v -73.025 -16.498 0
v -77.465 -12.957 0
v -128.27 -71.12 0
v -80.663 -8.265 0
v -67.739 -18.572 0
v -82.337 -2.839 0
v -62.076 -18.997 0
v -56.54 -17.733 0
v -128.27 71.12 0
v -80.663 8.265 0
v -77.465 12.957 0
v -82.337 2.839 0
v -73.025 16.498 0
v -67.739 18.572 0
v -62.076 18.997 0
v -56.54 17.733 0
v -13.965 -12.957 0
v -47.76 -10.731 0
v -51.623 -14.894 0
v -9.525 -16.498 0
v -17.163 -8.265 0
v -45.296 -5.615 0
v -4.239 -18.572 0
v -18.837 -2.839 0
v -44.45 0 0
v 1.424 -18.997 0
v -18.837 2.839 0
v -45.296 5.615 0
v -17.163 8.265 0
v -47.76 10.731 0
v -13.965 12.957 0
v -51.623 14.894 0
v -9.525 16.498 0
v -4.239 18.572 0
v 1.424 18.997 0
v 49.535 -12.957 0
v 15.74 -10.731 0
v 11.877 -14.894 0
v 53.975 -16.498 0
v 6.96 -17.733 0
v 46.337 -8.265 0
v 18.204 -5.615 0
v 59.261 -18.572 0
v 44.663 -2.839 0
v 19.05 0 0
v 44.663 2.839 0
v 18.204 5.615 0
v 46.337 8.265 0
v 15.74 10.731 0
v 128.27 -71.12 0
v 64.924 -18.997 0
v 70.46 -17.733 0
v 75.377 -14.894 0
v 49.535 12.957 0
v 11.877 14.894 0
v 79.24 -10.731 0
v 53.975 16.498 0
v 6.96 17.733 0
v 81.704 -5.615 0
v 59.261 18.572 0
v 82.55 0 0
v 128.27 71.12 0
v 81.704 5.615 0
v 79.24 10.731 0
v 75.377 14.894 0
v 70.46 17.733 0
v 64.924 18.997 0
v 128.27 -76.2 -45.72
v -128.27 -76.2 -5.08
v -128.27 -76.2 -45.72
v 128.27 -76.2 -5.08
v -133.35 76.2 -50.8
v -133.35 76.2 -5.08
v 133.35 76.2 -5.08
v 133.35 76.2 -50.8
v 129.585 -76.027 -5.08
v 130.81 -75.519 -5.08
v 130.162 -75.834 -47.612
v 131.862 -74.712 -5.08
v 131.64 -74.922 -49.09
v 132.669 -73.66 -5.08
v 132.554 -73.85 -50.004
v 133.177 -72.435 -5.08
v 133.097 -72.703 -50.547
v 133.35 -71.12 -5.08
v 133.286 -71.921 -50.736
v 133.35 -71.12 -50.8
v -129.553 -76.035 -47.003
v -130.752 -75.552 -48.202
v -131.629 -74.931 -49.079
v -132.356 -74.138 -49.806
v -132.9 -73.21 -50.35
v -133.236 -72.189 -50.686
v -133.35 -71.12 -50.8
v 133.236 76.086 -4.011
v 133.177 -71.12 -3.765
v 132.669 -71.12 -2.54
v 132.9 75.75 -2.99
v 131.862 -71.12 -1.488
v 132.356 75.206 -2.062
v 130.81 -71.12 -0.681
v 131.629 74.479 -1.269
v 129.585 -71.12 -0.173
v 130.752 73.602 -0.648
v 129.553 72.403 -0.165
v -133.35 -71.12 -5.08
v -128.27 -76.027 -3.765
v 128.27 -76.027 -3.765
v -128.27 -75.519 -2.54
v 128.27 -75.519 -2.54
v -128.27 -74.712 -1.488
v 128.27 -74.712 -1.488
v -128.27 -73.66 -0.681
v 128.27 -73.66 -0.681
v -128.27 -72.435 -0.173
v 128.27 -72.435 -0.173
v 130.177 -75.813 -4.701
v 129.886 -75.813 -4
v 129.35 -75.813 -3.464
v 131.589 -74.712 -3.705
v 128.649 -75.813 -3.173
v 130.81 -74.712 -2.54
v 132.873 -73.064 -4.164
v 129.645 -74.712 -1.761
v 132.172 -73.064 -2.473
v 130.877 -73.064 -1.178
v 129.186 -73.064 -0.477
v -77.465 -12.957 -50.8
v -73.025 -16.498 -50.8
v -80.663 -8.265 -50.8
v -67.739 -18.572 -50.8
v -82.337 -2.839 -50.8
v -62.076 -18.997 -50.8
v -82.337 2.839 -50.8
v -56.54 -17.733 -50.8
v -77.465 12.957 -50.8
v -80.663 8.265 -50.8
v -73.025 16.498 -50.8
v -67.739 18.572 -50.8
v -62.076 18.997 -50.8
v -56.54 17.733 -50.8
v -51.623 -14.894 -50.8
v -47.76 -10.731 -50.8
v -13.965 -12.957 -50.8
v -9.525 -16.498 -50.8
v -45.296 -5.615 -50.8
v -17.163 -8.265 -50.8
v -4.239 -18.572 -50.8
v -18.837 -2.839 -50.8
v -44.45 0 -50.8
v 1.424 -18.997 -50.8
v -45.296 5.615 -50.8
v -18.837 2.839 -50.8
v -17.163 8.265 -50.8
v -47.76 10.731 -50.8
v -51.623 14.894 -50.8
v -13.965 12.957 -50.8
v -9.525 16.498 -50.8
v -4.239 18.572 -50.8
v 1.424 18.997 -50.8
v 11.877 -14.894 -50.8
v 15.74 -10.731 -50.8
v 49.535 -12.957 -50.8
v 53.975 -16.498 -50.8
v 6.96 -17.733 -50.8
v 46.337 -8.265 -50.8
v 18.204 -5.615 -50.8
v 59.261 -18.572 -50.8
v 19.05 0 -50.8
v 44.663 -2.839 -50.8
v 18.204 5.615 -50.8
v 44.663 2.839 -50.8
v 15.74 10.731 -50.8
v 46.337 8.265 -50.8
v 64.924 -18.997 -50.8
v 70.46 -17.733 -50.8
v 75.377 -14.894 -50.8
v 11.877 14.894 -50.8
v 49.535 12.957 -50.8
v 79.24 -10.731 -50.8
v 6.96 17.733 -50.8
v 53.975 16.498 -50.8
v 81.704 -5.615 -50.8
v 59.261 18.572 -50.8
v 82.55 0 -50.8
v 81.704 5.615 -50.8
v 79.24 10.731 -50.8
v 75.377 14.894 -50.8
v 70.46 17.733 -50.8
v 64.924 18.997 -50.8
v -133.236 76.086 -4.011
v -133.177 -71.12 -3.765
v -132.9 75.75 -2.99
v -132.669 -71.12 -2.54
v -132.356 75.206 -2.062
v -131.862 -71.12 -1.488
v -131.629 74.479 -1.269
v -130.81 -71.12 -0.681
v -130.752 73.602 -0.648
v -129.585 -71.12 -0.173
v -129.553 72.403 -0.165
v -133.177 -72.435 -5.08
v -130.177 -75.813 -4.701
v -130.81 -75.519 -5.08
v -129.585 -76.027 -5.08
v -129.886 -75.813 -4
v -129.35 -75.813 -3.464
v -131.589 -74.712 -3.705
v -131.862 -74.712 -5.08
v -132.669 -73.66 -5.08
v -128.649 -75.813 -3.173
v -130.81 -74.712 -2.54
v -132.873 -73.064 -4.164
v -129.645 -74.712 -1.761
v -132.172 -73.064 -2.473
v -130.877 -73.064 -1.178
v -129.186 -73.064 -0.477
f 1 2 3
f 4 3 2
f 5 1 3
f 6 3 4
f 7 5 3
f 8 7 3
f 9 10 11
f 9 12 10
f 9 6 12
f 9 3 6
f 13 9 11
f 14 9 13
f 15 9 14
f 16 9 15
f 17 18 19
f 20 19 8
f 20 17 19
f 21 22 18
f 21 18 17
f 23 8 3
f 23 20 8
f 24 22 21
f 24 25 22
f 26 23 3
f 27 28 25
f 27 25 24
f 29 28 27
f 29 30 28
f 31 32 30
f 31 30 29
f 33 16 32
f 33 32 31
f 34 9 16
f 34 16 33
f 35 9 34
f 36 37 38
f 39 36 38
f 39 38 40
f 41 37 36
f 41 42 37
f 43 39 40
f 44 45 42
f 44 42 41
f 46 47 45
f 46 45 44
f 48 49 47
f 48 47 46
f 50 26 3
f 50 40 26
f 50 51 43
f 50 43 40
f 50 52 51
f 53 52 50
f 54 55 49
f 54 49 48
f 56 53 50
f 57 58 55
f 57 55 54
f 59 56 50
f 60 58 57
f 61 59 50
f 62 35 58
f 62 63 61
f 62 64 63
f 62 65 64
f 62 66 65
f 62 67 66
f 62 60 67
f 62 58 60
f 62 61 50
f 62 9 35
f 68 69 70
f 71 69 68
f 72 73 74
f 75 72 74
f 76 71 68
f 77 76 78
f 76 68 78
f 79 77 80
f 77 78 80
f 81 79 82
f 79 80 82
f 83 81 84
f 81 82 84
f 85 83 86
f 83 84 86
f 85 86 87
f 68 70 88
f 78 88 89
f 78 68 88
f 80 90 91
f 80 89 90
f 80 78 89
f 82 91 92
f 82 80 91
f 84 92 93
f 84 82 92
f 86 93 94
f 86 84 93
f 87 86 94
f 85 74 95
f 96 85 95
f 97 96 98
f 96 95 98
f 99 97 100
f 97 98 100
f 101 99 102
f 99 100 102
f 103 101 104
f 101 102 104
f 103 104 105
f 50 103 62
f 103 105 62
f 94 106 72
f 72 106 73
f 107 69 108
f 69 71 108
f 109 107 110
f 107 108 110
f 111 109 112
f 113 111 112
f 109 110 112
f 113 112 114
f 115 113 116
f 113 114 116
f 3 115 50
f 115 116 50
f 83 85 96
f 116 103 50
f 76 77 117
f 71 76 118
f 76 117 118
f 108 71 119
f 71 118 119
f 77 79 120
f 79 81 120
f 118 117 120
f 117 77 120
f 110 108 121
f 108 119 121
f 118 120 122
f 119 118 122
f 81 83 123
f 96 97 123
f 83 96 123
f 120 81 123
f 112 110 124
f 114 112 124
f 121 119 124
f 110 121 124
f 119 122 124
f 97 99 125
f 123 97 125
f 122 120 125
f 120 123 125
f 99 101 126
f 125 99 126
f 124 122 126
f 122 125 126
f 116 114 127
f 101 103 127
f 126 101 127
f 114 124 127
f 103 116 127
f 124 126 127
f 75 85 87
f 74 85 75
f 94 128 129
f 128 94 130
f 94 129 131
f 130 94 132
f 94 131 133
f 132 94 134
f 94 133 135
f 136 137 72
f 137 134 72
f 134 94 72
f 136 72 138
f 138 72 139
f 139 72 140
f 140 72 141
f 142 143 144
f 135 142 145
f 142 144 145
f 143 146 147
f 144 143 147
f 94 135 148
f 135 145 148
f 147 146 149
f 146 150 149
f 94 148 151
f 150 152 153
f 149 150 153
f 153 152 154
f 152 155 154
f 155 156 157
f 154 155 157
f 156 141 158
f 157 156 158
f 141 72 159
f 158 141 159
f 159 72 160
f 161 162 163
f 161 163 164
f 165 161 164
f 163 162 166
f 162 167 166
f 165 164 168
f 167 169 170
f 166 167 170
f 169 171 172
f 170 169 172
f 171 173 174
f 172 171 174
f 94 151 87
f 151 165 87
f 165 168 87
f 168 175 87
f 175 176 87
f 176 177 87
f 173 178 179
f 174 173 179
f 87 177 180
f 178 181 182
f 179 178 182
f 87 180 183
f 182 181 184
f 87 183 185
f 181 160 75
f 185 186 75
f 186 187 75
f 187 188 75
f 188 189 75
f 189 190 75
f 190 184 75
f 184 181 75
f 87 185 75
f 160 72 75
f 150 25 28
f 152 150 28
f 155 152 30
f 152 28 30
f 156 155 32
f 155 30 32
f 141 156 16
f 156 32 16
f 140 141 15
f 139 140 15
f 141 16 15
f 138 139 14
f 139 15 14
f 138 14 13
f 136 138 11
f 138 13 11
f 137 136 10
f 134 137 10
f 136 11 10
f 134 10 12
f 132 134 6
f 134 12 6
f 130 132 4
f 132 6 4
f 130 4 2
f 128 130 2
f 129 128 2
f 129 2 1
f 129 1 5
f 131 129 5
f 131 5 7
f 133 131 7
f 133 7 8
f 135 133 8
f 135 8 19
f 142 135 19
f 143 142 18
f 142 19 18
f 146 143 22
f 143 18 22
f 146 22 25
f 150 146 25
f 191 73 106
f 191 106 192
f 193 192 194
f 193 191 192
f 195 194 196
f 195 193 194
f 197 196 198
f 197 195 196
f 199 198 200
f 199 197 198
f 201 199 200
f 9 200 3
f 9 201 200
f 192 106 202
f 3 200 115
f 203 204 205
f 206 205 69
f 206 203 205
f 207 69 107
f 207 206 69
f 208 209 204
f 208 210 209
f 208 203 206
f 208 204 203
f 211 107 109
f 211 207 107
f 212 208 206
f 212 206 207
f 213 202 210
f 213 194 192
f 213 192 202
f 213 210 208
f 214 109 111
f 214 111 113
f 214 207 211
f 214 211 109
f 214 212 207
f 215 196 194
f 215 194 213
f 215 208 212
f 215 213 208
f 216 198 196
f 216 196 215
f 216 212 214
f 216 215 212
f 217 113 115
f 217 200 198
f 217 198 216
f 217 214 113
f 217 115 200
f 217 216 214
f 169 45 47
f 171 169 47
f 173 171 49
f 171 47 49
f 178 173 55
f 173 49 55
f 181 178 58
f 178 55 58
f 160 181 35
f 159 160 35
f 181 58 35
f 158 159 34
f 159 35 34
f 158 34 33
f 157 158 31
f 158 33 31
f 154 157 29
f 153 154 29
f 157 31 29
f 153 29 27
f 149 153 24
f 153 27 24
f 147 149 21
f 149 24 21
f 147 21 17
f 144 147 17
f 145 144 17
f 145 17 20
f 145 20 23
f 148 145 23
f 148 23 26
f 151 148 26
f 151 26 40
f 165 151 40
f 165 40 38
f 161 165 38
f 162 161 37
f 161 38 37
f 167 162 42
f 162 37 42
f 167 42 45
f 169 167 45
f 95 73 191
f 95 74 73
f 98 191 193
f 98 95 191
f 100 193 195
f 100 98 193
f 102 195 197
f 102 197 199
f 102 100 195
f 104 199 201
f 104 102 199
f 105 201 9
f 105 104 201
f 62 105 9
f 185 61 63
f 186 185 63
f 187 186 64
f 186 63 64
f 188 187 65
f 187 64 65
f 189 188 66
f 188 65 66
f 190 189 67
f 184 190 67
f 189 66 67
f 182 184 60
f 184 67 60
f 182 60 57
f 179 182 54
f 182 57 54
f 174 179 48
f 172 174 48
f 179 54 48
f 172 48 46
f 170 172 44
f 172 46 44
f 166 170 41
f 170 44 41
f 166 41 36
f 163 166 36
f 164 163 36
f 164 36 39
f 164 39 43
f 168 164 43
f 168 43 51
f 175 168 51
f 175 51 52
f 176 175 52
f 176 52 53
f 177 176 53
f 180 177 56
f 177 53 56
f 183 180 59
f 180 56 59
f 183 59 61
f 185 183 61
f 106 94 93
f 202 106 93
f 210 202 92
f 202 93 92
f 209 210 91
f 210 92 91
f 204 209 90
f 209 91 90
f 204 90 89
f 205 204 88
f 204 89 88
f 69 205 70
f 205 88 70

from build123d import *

# Parameters (mm, degrees)
F0_W     = 266.7
F0_H     = 152.4
F0_R     = 19.05
F1_DEPTH = 50.8
F2_R     = 5.08


# Not quite as in the source:
# - a feature names something its author has since deleted; it is built from what else it names


with BuildPart() as f1:
    # F0 (on Top) → F1 (new body)
    with BuildSketch(Plane.XY):
        Rectangle(F0_W, F0_H)
        with Locations((-63.5, 0)):
            Circle(F0_R, mode=Mode.SUBTRACT)
        Circle(F0_R, mode=Mode.SUBTRACT)
        with Locations((63.5, 0)):
            Circle(F0_R, mode=Mode.SUBTRACT)
    extrude(amount=-F1_DEPTH)

    # F2
    f2_edges = [f1.edges().sort_by_distance(p)[0] for p in [
        (-133.35, 0, 0),
        (0, 76.2, 0),
        (133.35, 0, 0),
        (-133.35, -76.2, -25.4),
        (133.35, -76.2, -25.4),
        (0, -76.2, 0),
        (0, -76.2, -50.8),
    ]]
    fillet(f2_edges, radius=F2_R)


solid = f1.part
